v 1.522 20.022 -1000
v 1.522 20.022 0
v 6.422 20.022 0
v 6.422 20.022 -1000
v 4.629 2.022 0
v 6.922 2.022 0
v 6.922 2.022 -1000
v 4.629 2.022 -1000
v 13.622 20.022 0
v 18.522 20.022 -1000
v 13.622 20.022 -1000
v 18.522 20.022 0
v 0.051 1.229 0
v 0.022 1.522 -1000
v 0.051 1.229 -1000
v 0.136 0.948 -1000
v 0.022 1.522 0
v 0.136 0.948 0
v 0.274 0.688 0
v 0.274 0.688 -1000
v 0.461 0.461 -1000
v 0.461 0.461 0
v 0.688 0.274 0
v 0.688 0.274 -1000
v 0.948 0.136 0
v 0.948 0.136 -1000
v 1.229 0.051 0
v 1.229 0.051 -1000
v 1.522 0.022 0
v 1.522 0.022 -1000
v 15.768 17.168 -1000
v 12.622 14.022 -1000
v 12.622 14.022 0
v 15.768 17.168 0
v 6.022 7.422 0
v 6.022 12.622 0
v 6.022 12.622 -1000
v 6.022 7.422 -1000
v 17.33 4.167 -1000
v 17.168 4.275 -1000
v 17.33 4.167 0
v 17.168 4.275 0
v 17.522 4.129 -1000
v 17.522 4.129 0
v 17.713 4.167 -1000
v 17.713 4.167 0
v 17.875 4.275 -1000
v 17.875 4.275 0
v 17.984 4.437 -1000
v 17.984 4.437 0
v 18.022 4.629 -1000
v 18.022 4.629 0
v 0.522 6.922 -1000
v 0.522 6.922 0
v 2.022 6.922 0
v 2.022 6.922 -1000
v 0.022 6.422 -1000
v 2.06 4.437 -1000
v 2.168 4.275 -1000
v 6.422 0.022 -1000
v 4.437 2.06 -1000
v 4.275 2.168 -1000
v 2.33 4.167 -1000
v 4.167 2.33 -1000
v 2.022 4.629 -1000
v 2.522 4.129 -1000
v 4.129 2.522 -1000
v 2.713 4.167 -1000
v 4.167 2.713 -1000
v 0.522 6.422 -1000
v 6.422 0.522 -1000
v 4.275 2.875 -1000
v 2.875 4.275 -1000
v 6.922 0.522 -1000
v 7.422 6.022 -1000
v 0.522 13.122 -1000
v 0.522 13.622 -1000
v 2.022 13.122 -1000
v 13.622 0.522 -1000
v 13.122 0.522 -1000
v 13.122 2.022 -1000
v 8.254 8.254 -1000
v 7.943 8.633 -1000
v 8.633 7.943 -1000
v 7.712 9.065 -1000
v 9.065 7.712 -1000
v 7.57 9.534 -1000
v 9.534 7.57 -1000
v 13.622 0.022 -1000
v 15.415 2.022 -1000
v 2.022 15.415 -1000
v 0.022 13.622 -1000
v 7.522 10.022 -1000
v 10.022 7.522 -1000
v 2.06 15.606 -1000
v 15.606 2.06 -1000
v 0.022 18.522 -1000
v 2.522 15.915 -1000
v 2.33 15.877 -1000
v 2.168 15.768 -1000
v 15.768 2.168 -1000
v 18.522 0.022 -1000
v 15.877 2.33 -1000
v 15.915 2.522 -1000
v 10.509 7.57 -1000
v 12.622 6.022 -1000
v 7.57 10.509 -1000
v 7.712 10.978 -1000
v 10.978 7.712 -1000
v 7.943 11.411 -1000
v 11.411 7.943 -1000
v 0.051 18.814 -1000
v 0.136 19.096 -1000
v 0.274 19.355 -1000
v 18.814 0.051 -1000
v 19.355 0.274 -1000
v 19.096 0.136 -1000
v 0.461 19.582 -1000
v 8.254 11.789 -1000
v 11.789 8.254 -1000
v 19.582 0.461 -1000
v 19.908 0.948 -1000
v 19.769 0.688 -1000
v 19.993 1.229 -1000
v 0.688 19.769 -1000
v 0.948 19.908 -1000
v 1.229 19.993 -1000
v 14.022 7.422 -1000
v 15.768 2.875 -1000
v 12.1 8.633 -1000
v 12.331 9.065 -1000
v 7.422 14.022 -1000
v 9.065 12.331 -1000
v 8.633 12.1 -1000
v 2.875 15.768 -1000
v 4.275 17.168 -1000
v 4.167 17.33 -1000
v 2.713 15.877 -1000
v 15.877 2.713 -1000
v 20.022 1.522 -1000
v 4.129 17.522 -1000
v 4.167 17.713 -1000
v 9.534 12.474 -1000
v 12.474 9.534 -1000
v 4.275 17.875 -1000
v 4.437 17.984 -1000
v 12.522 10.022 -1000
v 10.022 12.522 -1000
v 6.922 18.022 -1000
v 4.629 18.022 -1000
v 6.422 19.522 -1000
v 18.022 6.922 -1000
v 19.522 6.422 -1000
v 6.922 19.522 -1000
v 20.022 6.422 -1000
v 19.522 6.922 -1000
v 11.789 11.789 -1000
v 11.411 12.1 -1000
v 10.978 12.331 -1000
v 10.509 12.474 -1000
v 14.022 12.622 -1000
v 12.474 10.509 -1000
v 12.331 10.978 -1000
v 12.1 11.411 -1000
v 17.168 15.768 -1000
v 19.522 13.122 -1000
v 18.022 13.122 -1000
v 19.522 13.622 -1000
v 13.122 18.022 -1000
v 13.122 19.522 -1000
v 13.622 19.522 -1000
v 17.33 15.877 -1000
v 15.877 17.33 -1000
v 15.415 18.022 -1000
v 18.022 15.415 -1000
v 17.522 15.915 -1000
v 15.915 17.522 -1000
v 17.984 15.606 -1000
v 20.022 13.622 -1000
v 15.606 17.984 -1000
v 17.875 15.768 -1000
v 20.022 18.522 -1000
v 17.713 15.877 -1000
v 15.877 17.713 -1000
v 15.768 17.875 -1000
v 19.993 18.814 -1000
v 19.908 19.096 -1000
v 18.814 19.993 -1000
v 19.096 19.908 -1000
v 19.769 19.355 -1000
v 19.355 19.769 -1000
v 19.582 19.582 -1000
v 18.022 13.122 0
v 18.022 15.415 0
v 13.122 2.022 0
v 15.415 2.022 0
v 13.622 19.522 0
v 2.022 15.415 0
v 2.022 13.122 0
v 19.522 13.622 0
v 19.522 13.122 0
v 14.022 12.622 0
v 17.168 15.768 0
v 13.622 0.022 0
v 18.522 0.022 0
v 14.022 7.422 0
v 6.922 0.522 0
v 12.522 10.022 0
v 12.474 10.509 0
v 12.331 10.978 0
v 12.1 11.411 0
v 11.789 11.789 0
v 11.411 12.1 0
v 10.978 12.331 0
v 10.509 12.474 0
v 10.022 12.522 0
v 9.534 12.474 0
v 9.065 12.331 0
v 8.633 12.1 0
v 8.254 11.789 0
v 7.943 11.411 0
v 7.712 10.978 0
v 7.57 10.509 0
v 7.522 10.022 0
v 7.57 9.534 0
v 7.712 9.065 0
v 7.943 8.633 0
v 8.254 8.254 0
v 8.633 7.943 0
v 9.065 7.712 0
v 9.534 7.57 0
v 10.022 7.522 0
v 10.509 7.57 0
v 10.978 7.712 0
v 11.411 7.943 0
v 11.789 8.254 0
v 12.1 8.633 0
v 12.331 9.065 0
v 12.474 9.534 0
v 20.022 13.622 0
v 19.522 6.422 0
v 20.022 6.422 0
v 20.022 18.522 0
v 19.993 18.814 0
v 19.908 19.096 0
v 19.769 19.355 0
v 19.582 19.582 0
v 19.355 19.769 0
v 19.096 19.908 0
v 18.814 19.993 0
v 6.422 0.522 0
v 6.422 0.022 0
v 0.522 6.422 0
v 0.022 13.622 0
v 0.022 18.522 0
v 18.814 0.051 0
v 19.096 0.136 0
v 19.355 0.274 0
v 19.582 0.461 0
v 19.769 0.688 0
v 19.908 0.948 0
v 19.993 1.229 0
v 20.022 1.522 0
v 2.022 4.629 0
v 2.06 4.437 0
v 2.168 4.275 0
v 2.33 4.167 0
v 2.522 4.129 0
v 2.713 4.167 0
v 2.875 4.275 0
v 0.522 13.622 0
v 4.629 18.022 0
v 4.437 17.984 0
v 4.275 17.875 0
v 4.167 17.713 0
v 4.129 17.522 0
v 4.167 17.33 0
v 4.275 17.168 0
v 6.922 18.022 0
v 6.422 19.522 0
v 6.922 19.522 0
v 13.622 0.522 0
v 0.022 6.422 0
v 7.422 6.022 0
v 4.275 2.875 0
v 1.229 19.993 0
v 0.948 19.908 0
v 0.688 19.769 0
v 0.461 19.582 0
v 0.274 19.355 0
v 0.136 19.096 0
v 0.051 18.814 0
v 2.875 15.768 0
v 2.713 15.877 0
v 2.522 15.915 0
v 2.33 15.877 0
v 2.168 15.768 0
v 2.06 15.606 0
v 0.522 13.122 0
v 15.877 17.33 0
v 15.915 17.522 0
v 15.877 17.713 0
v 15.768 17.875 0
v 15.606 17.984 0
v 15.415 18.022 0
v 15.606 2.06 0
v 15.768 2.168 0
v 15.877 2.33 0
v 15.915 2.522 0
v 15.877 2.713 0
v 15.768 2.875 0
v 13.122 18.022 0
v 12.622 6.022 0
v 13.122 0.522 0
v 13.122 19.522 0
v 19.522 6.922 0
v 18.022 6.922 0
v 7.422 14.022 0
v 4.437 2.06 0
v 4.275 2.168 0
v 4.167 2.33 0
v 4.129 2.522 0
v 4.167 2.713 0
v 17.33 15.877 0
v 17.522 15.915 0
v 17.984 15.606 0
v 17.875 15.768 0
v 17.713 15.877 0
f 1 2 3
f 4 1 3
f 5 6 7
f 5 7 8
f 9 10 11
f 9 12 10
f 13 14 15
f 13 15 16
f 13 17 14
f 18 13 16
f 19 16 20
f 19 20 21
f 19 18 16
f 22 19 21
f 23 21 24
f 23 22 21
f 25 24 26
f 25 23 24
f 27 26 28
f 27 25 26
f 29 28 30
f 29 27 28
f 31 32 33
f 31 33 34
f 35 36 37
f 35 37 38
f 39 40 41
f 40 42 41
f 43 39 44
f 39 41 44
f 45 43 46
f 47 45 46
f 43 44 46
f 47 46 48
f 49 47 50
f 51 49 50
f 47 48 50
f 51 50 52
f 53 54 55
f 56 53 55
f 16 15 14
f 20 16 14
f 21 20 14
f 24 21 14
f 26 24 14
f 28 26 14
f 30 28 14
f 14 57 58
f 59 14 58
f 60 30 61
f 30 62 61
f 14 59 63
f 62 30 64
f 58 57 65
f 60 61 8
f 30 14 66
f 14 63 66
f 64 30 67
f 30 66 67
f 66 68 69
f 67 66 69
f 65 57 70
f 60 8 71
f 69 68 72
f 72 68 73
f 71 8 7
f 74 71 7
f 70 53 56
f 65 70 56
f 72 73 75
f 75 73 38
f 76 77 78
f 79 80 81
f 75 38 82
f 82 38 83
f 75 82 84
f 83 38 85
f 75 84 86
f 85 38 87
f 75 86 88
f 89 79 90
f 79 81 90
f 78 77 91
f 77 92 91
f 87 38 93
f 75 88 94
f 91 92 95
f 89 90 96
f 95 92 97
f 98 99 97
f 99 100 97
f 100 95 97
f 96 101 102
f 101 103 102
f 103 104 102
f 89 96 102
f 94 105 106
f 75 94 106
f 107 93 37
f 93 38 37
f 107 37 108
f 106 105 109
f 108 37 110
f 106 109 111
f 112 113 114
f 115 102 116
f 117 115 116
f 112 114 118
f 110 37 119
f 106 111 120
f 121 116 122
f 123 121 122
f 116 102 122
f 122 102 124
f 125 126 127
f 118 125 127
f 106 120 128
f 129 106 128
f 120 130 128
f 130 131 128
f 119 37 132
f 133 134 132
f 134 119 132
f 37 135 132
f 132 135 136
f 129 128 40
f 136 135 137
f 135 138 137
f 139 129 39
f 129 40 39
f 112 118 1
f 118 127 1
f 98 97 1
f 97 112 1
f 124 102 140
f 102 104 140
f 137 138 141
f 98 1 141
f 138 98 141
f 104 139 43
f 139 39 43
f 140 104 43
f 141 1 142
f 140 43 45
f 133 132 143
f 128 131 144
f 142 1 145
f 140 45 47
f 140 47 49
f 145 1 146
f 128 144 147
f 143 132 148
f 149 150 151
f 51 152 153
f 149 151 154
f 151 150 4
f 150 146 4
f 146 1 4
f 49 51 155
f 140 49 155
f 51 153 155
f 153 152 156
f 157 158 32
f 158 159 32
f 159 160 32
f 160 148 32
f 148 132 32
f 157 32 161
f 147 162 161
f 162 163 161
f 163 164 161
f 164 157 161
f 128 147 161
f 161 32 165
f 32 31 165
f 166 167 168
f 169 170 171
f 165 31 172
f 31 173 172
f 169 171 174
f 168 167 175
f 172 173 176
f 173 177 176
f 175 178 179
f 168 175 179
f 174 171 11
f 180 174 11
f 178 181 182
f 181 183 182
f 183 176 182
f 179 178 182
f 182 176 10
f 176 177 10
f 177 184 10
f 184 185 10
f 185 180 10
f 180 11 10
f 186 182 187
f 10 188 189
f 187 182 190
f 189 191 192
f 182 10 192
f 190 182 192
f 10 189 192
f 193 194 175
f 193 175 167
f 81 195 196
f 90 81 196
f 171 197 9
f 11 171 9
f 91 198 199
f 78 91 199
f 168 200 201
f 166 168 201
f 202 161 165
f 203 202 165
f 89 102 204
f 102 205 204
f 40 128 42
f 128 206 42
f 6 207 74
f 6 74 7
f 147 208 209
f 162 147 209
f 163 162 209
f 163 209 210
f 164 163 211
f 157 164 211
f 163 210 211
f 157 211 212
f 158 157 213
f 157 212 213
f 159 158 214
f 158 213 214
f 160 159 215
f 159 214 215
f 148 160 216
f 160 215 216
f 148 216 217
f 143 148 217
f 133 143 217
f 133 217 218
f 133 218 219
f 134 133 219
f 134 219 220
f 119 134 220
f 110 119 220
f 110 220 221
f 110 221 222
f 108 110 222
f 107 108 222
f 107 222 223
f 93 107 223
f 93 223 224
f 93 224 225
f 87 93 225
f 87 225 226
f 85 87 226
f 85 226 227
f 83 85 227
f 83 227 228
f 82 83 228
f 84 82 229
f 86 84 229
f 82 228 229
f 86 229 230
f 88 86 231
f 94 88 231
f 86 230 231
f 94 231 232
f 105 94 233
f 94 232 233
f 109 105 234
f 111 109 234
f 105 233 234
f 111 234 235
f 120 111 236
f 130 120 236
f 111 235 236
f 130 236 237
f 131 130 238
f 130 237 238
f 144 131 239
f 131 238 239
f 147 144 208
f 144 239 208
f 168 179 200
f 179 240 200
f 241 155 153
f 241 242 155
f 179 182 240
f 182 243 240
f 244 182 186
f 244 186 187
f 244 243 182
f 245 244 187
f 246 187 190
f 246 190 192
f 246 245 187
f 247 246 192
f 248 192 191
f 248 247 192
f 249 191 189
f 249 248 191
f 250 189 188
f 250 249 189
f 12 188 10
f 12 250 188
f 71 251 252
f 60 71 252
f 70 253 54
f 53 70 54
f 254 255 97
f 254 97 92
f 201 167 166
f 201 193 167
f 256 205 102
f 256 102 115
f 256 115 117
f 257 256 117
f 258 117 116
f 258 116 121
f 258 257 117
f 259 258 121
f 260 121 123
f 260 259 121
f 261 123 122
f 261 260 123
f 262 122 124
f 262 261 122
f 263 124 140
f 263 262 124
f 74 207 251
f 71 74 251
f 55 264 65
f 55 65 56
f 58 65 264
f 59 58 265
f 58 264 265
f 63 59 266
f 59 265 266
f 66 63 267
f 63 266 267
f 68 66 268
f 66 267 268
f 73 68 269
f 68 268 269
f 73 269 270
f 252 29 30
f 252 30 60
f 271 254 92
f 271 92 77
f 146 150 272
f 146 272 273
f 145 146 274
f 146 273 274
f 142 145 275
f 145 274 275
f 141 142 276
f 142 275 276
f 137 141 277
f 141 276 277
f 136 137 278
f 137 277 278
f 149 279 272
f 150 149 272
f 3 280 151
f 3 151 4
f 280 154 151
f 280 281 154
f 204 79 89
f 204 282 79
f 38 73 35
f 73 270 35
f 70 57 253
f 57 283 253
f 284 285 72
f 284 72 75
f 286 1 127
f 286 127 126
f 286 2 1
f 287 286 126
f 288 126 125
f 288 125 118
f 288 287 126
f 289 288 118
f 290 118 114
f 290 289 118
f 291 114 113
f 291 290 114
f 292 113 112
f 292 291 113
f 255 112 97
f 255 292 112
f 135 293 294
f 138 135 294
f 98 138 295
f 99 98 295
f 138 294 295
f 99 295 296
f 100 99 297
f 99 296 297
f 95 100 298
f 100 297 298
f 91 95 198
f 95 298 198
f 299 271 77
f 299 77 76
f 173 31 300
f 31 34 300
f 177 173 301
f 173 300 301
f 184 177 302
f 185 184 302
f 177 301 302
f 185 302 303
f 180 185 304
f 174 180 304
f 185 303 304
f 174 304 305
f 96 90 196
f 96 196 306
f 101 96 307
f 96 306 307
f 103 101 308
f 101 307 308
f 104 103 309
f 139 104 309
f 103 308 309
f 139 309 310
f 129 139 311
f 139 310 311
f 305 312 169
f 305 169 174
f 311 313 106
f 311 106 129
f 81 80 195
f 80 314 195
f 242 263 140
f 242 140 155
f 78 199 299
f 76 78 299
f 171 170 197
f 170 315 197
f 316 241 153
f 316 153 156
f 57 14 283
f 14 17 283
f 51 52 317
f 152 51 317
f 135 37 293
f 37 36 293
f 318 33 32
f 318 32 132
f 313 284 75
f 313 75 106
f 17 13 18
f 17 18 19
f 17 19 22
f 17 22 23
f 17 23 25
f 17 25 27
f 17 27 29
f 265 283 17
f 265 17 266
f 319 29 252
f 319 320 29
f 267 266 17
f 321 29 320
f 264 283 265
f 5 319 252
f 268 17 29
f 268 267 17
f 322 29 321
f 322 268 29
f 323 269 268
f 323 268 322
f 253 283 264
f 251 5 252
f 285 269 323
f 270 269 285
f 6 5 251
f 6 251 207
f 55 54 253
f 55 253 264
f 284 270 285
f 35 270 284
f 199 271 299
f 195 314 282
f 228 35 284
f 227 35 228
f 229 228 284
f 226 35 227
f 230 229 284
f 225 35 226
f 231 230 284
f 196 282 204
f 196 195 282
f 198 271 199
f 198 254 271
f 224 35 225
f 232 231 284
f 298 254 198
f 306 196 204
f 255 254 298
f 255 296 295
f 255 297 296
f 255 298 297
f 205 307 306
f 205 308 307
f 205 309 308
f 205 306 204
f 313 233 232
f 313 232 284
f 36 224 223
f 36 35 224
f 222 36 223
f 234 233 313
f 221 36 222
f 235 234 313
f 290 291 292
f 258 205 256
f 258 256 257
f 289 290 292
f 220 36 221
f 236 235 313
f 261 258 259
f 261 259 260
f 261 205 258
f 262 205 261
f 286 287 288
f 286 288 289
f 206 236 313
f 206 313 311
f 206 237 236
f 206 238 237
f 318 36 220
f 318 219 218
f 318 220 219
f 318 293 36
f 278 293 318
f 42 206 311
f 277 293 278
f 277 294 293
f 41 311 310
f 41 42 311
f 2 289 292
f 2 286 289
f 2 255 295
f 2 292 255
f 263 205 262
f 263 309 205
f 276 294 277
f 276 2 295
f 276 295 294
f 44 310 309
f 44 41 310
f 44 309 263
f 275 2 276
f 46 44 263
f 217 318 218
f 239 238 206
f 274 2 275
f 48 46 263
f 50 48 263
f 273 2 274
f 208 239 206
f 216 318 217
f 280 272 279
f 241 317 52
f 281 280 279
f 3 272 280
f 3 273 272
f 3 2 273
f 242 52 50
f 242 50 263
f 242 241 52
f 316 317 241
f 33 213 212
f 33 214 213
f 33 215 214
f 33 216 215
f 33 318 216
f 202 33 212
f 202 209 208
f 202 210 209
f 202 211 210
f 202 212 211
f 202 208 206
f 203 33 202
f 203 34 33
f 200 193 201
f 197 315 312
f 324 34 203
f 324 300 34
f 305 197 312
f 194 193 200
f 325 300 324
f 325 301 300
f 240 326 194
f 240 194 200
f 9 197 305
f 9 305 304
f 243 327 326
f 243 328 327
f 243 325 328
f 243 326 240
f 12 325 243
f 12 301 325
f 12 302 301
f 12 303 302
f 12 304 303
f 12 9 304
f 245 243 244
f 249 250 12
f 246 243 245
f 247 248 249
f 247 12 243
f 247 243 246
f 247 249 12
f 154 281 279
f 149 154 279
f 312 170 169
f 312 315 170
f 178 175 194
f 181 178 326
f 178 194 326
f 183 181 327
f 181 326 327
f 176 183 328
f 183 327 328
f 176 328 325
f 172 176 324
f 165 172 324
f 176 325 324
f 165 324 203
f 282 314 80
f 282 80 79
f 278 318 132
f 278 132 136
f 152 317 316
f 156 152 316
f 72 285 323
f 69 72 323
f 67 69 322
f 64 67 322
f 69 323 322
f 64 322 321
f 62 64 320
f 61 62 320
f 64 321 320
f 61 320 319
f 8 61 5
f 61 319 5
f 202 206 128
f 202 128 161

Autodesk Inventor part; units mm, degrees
ref_plane "YZ Plane" through (0, 0, 0) normal (1, 0, 0) x (0, 1, 0)
ref_plane "XZ Plane" through (0, 0, 0) normal (0, 1, 0) x (-1, 0, 0)
ref_plane "XY Plane" through (0, 0, 0) normal (0, 0, 1) x (1, 0, 0)
sketch "Sketch1" plane through (0, 0, 0) normal (0, 0, 1) x (1, 0, 0)
  circle A0 centre (10.0217, 10.0217) radius 2.5
  line L0 (7.4217, 6.0217) -> (12.6217, 6.0217)
  line L1 (14.0217, 7.4217) -> (14.0217, 12.6217)
  line L2 (12.6217, 14.0217) -> (7.4217, 14.0217)
  line L3 (6.0217, 12.6217) -> (6.0217, 7.4217)
  line L4 (1.5217, 20.0217) -> (6.4217, 20.0217)
  line L5 (18.5217, 20.0217) -> (13.6217, 20.0217)
  arc A1 (20.0217, 18.5217) -> (18.5217, 20.0217) centre (18.5217, 18.5217) ccw
  line L6 (6.9217, 19.5217) -> (6.4217, 19.5217)
  line L7 (6.4217, 19.5217) -> (6.4217, 20.0217)
  line L8 (13.1217, 19.5217) -> (13.6217, 19.5217)
  line L9 (13.6217, 19.5217) -> (13.6217, 20.0217)
  line L10 (0.0217, 18.5217) -> (0.0217, 13.6217)
  arc A2 (1.5217, 20.0217) -> (0.0217, 18.5217) centre (1.5217, 18.5217) ccw
  line L11 (20.0217, 18.5217) -> (20.0217, 13.6217)
  line L12 (0.0217, 1.5217) -> (0.0217, 6.4217)
  arc A3 (0.0217, 1.5217) -> (1.5217, 0.0217) centre (1.5217, 1.5217) ccw
  line L13 (20.0217, 1.5217) -> (20.0217, 6.4217)
  line L14 (1.5217, 0.0217) -> (6.4217, 0.0217)
  line L15 (18.5217, 0.0217) -> (13.6217, 0.0217)
  arc A4 (18.5217, 0.0217) -> (20.0217, 1.5217) centre (18.5217, 1.5217) ccw
  line L16 (0.0217, 13.6217) -> (0.5217, 13.6217)
  line L17 (0.5217, 13.6217) -> (0.5217, 13.1217)
  line L18 (0.0217, 6.4217) -> (0.5217, 6.4217)
  line L19 (0.5217, 6.4217) -> (0.5217, 6.9217)
  line L20 (20.0217, 6.4217) -> (19.5217, 6.4217)
  line L21 (19.5217, 6.4217) -> (19.5217, 6.9217)
  line L22 (20.0217, 13.6217) -> (19.5217, 13.6217)
  line L23 (19.5217, 13.6217) -> (19.5217, 13.1217)
  line L24 (6.9217, 0.5217) -> (6.4217, 0.5217)
  line L25 (6.4217, 0.5217) -> (6.4217, 0.0217)
  line L26 (13.1217, 0.5217) -> (13.6217, 0.5217)
  line L27 (13.6217, 0.5217) -> (13.6217, 0.0217)
  line L28 (0.5217, 6.9217) -> (2.0217, 6.9217)
  line L29 (6.9217, 0.5217) -> (6.9217, 2.0217)
  line L30 (6.9217, 2.0217) -> (4.6288, 2.0217)
  arc A5 (4.2753, 2.8753) -> (4.6288, 2.0217) centre (4.6288, 2.5217) ccw
  line L31 (2.0217, 4.6288) -> (2.0217, 6.9217)
  arc A6 (2.0217, 4.6288) -> (2.8753, 4.2753) centre (2.5217, 4.6288) ccw
  line L32 (2.8753, 4.2753) -> (6.0217, 7.4217)
  line L33 (4.2753, 2.8753) -> (7.4217, 6.0217)
  line L34 (13.1217, 0.5217) -> (13.1217, 2.0217)
  line L35 (13.1217, 2.0217) -> (15.4146, 2.0217)
  line L36 (18.0217, 4.6288) -> (18.0217, 6.9217)
  arc A7 (17.1682, 4.2753) -> (18.0217, 4.6288) centre (17.5217, 4.6288) ccw
  line L37 (18.0217, 6.9217) -> (19.5217, 6.9217)
  line L38 (13.1217, 19.5217) -> (13.1217, 18.0217)
  line L39 (13.1217, 18.0217) -> (15.4146, 18.0217)
  arc A8 (15.7682, 17.1682) -> (15.4146, 18.0217) centre (15.4146, 17.5217) ccw
  line L40 (18.0217, 15.4146) -> (18.0217, 13.1217)
  arc A9 (18.0217, 15.4146) -> (17.1682, 15.7682) centre (17.5217, 15.4146) ccw
  line L41 (18.0217, 13.1217) -> (19.5217, 13.1217)
  line L42 (6.9217, 19.5217) -> (6.9217, 18.0217)
  line L43 (6.9217, 18.0217) -> (4.6288, 18.0217)
  line L44 (2.0217, 15.4146) -> (2.0217, 13.1217)
  arc A10 (2.8753, 15.7682) -> (2.0217, 15.4146) centre (2.5217, 15.4146) ccw
  line L45 (2.0217, 13.1217) -> (0.5217, 13.1217)
  line L46 (12.6217, 6.0217) -> (15.7682, 2.8753)
  arc A11 (15.4146, 2.0217) -> (15.7682, 2.8753) centre (15.4146, 2.5217) ccw
  line L47 (14.0217, 7.4217) -> (17.1682, 4.2753)
  line L48 (12.6217, 14.0217) -> (15.7682, 17.1682)
  line L49 (14.0217, 12.6217) -> (17.1682, 15.7682)
  line L50 (6.0217, 12.6217) -> (2.8753, 15.7682)
  line L51 (7.4217, 14.0217) -> (4.2753, 17.1682)
  arc A12 (4.6288, 18.0217) -> (4.2753, 17.1682) centre (4.6288, 17.5217) ccw
  point P0 (0, 0)
extrude "Extrusion1" add sketch "Sketch1" against normal blind 1000
properties part number "Alumunium Profile 20 x 20" material "Aluminum 6061"
